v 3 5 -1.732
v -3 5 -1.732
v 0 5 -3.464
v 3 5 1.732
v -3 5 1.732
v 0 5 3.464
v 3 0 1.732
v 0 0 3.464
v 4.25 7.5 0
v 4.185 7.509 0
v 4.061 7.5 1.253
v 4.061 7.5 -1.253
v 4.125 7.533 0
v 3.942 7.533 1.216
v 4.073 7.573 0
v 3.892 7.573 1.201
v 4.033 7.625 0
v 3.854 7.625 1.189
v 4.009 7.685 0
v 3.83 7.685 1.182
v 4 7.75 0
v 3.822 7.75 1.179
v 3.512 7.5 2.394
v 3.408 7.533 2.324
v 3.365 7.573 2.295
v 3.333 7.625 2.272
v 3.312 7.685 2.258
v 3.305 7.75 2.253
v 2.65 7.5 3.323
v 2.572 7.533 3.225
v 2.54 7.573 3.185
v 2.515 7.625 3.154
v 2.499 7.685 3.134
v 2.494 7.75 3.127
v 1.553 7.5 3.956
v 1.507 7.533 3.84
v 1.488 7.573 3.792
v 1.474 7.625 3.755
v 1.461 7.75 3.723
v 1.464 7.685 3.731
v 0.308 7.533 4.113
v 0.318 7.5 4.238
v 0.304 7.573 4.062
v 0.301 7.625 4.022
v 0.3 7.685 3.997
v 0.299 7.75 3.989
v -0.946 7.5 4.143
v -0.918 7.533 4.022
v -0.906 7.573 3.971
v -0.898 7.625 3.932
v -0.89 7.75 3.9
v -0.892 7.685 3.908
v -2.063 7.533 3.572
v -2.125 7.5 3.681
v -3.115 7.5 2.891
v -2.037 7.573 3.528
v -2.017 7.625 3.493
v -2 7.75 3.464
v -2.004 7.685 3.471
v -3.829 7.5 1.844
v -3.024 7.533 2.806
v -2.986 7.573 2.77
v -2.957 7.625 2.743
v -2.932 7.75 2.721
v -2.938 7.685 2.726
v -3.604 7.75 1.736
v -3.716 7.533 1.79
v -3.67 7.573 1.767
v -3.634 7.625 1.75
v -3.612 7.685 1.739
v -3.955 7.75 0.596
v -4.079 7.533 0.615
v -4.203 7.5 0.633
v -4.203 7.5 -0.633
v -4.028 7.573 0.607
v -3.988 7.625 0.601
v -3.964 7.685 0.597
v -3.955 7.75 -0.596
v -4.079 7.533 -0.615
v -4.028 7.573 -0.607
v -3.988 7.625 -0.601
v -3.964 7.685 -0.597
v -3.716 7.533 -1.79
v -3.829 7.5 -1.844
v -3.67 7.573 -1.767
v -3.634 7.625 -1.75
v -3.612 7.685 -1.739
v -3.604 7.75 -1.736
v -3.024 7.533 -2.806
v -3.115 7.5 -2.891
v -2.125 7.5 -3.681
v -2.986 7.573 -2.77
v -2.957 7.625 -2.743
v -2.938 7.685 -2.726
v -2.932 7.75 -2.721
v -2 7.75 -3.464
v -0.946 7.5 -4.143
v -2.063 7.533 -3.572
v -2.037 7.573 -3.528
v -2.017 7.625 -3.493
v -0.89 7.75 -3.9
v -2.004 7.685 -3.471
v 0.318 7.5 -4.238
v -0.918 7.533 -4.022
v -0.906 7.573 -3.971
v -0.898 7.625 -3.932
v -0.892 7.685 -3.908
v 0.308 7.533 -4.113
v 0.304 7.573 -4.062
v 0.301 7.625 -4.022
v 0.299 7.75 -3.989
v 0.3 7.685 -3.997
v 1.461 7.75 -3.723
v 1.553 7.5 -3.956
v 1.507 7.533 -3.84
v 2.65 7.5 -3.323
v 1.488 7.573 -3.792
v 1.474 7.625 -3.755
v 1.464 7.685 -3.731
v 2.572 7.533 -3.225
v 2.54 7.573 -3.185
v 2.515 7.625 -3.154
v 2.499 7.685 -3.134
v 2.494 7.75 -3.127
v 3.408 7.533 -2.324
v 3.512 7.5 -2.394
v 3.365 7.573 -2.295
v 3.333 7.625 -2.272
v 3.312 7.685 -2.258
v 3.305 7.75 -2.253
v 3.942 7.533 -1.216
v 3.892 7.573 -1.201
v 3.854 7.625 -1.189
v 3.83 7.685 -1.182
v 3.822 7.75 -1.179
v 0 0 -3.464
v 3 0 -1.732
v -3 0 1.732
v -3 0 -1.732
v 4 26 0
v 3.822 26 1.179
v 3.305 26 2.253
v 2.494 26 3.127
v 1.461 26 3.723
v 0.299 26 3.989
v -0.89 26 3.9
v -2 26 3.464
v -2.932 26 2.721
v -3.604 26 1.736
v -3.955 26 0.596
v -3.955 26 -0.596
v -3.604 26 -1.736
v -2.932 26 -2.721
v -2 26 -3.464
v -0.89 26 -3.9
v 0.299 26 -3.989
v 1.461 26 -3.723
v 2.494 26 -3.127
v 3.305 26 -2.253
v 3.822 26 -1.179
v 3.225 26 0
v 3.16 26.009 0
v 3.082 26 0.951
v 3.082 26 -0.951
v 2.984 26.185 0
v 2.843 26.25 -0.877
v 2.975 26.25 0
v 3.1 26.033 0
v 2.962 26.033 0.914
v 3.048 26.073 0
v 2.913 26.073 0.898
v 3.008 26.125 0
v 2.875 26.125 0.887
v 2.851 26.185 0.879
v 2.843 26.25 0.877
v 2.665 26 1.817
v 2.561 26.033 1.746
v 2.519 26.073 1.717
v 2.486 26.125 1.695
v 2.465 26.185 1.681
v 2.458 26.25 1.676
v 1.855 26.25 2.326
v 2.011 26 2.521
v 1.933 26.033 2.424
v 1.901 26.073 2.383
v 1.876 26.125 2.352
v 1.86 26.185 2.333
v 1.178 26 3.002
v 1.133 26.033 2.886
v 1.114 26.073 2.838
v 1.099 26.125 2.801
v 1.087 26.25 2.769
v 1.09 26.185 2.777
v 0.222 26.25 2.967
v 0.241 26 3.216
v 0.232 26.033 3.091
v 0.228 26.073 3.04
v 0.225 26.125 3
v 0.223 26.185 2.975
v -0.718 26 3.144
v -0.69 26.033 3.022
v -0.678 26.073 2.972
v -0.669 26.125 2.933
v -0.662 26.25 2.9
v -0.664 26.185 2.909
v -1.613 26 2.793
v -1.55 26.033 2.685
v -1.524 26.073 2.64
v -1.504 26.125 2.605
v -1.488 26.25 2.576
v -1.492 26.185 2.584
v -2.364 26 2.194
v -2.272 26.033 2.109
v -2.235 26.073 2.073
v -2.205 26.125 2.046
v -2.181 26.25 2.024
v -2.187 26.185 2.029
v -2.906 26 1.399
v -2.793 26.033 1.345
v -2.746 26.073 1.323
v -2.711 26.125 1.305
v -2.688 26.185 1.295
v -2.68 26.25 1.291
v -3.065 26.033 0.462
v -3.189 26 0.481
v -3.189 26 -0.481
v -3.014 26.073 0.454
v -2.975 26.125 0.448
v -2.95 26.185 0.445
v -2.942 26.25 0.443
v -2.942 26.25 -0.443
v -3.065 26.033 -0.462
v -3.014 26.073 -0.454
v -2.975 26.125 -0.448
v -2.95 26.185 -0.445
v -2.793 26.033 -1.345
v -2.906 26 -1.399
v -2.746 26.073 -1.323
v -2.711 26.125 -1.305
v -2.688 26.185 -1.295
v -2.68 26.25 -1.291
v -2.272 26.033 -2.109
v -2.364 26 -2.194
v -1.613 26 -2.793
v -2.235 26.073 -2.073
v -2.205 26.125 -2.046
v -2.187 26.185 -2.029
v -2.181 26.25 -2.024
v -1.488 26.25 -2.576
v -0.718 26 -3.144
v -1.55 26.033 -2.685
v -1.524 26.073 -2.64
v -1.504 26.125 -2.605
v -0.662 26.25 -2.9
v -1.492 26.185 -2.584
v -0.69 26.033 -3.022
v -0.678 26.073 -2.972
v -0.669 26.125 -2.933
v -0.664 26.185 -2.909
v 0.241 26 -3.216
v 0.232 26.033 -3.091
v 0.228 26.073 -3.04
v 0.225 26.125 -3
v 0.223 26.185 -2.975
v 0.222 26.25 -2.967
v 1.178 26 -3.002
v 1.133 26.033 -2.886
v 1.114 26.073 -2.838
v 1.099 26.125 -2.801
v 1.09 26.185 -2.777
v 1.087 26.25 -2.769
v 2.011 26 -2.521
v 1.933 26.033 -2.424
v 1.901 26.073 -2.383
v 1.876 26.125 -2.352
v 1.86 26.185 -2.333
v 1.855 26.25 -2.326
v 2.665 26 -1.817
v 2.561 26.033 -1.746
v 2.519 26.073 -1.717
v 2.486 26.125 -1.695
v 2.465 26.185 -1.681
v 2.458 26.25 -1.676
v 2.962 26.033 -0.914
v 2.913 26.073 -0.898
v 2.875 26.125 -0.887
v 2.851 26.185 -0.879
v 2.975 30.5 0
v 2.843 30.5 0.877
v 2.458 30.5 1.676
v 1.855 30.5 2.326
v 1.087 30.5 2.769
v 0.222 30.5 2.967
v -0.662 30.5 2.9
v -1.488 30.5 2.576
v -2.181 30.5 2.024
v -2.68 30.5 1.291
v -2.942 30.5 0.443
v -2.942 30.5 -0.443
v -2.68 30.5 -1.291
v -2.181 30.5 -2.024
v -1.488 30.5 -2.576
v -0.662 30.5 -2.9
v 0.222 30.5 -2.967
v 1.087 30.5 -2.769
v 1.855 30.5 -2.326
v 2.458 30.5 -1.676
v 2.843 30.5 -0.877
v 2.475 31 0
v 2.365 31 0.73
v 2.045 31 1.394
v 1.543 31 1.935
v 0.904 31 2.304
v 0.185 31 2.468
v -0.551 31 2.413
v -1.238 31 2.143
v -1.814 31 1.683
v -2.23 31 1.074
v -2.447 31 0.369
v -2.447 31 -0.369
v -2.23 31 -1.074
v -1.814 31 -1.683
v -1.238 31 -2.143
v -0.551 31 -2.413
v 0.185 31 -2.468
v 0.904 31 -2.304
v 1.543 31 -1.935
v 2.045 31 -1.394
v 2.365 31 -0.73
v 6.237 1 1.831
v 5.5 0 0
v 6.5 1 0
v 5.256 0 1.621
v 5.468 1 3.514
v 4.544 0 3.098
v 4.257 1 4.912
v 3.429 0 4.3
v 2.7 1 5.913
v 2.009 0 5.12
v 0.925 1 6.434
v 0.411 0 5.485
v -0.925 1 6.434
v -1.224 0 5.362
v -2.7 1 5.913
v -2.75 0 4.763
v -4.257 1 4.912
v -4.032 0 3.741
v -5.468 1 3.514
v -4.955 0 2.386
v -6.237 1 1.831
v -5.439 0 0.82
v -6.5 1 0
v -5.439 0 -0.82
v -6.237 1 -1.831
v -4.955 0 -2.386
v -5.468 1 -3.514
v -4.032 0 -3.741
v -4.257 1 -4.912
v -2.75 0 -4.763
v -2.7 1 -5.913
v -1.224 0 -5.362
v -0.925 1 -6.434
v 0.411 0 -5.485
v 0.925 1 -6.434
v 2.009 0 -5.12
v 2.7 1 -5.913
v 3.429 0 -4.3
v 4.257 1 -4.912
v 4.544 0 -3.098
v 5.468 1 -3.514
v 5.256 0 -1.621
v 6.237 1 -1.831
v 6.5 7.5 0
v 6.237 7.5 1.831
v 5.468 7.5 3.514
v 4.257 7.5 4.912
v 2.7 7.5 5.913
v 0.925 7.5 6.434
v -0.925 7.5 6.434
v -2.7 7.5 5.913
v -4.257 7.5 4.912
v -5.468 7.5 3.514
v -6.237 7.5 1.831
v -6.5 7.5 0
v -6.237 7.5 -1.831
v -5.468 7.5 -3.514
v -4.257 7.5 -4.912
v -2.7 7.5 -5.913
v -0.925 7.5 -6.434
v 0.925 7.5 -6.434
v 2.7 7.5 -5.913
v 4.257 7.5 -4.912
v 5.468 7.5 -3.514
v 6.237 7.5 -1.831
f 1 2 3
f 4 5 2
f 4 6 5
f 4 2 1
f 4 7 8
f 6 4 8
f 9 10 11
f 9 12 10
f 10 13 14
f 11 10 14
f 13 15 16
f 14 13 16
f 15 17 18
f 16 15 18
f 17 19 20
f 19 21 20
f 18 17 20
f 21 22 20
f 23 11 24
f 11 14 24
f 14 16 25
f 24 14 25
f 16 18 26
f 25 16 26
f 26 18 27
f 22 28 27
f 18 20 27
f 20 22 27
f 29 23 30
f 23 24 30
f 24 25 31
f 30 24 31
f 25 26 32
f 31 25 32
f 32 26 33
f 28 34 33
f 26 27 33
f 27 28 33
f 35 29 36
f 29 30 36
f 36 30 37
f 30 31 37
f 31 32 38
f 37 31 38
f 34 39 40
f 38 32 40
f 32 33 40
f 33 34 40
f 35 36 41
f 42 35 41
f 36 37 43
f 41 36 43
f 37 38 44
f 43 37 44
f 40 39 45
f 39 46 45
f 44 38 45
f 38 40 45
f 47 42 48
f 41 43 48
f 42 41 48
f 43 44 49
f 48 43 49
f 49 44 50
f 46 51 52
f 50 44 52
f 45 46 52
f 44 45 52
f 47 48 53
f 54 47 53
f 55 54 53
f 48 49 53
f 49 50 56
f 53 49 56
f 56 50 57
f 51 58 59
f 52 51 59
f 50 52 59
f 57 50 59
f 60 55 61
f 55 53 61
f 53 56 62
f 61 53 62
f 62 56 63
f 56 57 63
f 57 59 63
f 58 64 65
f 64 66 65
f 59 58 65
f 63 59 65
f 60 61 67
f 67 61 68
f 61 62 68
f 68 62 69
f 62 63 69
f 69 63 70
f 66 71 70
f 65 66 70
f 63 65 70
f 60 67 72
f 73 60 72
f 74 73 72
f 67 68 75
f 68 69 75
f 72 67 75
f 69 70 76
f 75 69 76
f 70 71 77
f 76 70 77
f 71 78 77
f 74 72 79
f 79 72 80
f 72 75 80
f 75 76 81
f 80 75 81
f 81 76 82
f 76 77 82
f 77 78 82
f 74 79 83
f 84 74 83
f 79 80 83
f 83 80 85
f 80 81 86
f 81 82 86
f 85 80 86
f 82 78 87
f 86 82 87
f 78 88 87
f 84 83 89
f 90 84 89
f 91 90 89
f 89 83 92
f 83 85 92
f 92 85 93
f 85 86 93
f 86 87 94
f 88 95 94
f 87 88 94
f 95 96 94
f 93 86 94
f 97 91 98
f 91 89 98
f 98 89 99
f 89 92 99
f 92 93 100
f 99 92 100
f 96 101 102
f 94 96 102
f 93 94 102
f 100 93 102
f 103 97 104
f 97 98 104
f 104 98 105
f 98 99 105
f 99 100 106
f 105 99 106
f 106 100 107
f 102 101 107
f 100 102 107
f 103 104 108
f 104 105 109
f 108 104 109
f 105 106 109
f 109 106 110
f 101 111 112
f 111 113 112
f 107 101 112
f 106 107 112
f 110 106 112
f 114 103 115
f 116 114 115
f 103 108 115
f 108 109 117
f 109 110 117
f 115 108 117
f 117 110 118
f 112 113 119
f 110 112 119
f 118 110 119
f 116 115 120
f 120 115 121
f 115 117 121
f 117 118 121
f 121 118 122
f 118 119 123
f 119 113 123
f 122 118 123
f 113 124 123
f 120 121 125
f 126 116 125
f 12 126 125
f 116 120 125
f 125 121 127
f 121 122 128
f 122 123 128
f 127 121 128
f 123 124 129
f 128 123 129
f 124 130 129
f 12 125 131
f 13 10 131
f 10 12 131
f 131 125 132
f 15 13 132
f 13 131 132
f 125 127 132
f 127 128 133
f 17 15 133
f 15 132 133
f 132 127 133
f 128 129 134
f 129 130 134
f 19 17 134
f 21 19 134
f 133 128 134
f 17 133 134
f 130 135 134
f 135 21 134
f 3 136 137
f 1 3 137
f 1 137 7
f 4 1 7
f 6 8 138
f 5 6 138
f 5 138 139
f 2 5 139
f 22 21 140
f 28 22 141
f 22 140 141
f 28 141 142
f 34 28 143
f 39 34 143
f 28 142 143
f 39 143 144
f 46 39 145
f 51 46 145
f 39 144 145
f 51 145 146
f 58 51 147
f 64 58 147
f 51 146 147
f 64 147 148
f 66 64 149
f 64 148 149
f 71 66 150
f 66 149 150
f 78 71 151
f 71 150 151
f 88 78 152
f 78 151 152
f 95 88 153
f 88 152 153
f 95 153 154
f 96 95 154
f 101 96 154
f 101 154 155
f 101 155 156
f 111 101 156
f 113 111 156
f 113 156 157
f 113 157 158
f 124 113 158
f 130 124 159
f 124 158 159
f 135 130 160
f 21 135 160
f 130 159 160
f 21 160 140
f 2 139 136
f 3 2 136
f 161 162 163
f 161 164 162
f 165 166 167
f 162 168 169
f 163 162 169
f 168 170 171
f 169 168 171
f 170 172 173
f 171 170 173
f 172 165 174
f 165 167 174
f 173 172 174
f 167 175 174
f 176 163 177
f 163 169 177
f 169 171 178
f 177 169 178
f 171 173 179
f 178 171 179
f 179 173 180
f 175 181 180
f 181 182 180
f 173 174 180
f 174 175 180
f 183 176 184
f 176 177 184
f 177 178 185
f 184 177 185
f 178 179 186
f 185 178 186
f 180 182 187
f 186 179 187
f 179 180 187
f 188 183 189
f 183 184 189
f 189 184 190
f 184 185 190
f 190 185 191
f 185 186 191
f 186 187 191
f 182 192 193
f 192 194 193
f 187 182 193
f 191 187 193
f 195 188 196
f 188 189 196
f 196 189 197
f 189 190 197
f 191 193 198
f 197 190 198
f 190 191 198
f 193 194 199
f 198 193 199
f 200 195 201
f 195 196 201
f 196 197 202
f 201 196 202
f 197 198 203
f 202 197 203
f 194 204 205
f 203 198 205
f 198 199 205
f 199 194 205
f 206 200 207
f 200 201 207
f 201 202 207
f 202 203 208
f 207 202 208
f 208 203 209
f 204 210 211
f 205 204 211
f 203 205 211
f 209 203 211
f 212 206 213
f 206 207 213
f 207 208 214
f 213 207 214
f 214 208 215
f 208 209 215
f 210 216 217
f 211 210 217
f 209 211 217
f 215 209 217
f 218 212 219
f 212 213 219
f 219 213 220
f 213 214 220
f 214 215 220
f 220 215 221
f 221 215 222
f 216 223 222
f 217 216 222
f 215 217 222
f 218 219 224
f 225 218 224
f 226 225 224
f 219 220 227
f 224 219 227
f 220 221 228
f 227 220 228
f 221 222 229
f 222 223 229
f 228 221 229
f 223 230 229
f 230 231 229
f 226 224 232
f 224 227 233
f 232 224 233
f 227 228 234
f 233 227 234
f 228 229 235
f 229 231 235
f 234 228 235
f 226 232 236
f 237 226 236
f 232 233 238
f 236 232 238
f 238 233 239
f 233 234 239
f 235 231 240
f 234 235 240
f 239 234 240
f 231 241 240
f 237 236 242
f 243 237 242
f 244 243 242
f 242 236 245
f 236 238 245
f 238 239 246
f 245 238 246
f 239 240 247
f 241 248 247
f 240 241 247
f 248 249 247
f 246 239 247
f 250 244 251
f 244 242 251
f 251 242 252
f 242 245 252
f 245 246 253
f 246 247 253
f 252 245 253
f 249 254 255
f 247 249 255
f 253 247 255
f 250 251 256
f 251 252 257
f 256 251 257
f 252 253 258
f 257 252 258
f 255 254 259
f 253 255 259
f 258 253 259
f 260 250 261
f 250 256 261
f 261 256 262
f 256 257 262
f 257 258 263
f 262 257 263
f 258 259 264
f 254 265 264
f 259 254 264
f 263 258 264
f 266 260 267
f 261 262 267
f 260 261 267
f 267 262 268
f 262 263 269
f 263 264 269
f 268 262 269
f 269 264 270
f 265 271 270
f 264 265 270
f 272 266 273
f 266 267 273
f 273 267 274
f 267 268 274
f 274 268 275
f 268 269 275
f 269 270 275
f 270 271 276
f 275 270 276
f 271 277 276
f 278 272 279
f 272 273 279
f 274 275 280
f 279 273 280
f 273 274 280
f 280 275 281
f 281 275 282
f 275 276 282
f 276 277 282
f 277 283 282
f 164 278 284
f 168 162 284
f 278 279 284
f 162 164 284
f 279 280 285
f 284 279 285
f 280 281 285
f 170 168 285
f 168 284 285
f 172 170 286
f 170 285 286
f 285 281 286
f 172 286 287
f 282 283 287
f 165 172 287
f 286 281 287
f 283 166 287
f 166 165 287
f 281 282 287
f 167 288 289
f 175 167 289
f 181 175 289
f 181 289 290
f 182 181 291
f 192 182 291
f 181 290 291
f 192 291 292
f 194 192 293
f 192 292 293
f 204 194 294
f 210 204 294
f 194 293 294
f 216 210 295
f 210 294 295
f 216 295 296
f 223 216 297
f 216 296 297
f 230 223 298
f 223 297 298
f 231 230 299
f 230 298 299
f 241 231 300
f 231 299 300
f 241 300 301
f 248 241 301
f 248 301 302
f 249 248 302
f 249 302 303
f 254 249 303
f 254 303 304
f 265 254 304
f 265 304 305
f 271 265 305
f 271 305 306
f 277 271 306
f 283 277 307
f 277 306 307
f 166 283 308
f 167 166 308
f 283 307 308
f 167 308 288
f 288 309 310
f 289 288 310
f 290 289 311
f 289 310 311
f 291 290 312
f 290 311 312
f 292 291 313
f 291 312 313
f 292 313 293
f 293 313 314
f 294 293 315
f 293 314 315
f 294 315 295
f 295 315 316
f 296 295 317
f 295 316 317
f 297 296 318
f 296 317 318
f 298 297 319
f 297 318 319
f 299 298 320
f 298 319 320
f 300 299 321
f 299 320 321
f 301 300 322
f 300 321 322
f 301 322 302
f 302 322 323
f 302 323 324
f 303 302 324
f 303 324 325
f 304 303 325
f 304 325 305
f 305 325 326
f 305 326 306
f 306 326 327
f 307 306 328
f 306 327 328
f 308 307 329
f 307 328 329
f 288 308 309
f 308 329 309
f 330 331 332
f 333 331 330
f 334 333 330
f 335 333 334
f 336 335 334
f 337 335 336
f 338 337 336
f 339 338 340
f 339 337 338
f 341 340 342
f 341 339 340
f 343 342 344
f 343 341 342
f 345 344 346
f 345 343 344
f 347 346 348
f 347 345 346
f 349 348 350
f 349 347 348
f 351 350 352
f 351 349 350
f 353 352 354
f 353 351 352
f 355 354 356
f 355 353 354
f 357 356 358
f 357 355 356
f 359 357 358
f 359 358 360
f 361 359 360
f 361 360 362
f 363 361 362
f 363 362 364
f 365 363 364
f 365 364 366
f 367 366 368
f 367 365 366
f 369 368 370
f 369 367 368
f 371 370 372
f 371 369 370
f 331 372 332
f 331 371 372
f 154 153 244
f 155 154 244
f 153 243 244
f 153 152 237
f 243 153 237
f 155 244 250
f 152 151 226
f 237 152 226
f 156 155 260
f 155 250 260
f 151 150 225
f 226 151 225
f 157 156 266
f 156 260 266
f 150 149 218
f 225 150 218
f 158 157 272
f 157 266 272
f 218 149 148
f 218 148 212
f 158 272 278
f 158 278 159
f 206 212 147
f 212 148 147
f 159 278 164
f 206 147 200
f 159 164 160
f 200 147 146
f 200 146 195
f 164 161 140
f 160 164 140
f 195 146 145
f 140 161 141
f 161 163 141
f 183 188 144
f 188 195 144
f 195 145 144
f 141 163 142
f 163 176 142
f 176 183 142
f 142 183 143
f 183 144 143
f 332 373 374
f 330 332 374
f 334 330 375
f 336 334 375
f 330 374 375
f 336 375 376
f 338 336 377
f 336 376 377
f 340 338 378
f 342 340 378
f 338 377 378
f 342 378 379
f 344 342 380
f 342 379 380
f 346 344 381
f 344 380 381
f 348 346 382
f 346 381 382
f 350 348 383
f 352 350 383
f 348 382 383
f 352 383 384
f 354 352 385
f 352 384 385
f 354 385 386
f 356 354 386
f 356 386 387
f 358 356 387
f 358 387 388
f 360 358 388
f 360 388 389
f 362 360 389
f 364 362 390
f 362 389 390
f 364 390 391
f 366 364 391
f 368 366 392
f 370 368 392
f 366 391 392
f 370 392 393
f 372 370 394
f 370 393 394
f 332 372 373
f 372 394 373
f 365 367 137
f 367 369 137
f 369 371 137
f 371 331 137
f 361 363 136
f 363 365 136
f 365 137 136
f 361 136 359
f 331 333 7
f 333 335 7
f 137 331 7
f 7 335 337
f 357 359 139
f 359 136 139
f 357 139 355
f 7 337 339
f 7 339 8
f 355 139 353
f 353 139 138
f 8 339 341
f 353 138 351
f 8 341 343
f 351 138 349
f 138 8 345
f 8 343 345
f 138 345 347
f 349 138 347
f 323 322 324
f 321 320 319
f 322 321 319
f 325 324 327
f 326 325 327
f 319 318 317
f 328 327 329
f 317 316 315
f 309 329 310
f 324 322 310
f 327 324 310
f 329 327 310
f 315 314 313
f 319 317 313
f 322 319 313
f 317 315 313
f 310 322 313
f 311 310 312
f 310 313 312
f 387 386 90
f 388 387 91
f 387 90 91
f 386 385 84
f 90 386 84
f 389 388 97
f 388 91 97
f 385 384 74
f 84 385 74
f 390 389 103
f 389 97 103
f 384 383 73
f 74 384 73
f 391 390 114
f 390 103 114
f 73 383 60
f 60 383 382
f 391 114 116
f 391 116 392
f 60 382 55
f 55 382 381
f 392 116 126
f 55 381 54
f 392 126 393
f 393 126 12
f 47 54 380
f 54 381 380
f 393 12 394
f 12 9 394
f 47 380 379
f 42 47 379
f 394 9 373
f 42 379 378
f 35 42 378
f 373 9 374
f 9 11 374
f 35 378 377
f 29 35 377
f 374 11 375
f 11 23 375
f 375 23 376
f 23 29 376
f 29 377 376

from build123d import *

# Parameters (mm, degrees)
F2_R     = 0.25
F3_SIZE  = 0.5
F4_SIZE  = 1
F6_DEPTH = 5


with BuildPart() as f1:
    # F0 (on Top) → F1 (revolve)
    with BuildSketch(Plane.XY):
        Polygon((0, 31), (0, 0), (6.5, 0), (6.5, 7.5), (4, 7.5), (4, 26), (2.975, 26), (2.975, 31), align=None)
    revolve(axis=Axis((0, 15.5, 0), (0, -1, 0)))

    # F2
    f2_edges = [f1.edges().sort_by_distance(p)[0] for p in [
        (-4, 7.5, 0),
        (-2.975, 26, 0),
    ]]
    fillet(f2_edges, radius=F2_R)

    # F3
    f3_edges = [f1.edges().sort_by_distance(p)[0] for p in [
        (-2.975, 31, 0),
    ]]
    chamfer(f3_edges, length=F3_SIZE)

    # F4
    f4_edges = [f1.edges().sort_by_distance(p)[0] for p in [
        (-6.5, 0, 0),
    ]]
    chamfer(f4_edges, length=F4_SIZE)

    # F5 (on face) → F6 (cut)
    with BuildSketch(Plane.XZ):
        Polygon((-3, 1.732051), (-3, -1.732051), (0, -3.464102), (3, -1.732051), (3, 1.732051), (0, 3.464102), align=None)
    extrude(amount=-F6_DEPTH, mode=Mode.SUBTRACT)


solid = f1.part
